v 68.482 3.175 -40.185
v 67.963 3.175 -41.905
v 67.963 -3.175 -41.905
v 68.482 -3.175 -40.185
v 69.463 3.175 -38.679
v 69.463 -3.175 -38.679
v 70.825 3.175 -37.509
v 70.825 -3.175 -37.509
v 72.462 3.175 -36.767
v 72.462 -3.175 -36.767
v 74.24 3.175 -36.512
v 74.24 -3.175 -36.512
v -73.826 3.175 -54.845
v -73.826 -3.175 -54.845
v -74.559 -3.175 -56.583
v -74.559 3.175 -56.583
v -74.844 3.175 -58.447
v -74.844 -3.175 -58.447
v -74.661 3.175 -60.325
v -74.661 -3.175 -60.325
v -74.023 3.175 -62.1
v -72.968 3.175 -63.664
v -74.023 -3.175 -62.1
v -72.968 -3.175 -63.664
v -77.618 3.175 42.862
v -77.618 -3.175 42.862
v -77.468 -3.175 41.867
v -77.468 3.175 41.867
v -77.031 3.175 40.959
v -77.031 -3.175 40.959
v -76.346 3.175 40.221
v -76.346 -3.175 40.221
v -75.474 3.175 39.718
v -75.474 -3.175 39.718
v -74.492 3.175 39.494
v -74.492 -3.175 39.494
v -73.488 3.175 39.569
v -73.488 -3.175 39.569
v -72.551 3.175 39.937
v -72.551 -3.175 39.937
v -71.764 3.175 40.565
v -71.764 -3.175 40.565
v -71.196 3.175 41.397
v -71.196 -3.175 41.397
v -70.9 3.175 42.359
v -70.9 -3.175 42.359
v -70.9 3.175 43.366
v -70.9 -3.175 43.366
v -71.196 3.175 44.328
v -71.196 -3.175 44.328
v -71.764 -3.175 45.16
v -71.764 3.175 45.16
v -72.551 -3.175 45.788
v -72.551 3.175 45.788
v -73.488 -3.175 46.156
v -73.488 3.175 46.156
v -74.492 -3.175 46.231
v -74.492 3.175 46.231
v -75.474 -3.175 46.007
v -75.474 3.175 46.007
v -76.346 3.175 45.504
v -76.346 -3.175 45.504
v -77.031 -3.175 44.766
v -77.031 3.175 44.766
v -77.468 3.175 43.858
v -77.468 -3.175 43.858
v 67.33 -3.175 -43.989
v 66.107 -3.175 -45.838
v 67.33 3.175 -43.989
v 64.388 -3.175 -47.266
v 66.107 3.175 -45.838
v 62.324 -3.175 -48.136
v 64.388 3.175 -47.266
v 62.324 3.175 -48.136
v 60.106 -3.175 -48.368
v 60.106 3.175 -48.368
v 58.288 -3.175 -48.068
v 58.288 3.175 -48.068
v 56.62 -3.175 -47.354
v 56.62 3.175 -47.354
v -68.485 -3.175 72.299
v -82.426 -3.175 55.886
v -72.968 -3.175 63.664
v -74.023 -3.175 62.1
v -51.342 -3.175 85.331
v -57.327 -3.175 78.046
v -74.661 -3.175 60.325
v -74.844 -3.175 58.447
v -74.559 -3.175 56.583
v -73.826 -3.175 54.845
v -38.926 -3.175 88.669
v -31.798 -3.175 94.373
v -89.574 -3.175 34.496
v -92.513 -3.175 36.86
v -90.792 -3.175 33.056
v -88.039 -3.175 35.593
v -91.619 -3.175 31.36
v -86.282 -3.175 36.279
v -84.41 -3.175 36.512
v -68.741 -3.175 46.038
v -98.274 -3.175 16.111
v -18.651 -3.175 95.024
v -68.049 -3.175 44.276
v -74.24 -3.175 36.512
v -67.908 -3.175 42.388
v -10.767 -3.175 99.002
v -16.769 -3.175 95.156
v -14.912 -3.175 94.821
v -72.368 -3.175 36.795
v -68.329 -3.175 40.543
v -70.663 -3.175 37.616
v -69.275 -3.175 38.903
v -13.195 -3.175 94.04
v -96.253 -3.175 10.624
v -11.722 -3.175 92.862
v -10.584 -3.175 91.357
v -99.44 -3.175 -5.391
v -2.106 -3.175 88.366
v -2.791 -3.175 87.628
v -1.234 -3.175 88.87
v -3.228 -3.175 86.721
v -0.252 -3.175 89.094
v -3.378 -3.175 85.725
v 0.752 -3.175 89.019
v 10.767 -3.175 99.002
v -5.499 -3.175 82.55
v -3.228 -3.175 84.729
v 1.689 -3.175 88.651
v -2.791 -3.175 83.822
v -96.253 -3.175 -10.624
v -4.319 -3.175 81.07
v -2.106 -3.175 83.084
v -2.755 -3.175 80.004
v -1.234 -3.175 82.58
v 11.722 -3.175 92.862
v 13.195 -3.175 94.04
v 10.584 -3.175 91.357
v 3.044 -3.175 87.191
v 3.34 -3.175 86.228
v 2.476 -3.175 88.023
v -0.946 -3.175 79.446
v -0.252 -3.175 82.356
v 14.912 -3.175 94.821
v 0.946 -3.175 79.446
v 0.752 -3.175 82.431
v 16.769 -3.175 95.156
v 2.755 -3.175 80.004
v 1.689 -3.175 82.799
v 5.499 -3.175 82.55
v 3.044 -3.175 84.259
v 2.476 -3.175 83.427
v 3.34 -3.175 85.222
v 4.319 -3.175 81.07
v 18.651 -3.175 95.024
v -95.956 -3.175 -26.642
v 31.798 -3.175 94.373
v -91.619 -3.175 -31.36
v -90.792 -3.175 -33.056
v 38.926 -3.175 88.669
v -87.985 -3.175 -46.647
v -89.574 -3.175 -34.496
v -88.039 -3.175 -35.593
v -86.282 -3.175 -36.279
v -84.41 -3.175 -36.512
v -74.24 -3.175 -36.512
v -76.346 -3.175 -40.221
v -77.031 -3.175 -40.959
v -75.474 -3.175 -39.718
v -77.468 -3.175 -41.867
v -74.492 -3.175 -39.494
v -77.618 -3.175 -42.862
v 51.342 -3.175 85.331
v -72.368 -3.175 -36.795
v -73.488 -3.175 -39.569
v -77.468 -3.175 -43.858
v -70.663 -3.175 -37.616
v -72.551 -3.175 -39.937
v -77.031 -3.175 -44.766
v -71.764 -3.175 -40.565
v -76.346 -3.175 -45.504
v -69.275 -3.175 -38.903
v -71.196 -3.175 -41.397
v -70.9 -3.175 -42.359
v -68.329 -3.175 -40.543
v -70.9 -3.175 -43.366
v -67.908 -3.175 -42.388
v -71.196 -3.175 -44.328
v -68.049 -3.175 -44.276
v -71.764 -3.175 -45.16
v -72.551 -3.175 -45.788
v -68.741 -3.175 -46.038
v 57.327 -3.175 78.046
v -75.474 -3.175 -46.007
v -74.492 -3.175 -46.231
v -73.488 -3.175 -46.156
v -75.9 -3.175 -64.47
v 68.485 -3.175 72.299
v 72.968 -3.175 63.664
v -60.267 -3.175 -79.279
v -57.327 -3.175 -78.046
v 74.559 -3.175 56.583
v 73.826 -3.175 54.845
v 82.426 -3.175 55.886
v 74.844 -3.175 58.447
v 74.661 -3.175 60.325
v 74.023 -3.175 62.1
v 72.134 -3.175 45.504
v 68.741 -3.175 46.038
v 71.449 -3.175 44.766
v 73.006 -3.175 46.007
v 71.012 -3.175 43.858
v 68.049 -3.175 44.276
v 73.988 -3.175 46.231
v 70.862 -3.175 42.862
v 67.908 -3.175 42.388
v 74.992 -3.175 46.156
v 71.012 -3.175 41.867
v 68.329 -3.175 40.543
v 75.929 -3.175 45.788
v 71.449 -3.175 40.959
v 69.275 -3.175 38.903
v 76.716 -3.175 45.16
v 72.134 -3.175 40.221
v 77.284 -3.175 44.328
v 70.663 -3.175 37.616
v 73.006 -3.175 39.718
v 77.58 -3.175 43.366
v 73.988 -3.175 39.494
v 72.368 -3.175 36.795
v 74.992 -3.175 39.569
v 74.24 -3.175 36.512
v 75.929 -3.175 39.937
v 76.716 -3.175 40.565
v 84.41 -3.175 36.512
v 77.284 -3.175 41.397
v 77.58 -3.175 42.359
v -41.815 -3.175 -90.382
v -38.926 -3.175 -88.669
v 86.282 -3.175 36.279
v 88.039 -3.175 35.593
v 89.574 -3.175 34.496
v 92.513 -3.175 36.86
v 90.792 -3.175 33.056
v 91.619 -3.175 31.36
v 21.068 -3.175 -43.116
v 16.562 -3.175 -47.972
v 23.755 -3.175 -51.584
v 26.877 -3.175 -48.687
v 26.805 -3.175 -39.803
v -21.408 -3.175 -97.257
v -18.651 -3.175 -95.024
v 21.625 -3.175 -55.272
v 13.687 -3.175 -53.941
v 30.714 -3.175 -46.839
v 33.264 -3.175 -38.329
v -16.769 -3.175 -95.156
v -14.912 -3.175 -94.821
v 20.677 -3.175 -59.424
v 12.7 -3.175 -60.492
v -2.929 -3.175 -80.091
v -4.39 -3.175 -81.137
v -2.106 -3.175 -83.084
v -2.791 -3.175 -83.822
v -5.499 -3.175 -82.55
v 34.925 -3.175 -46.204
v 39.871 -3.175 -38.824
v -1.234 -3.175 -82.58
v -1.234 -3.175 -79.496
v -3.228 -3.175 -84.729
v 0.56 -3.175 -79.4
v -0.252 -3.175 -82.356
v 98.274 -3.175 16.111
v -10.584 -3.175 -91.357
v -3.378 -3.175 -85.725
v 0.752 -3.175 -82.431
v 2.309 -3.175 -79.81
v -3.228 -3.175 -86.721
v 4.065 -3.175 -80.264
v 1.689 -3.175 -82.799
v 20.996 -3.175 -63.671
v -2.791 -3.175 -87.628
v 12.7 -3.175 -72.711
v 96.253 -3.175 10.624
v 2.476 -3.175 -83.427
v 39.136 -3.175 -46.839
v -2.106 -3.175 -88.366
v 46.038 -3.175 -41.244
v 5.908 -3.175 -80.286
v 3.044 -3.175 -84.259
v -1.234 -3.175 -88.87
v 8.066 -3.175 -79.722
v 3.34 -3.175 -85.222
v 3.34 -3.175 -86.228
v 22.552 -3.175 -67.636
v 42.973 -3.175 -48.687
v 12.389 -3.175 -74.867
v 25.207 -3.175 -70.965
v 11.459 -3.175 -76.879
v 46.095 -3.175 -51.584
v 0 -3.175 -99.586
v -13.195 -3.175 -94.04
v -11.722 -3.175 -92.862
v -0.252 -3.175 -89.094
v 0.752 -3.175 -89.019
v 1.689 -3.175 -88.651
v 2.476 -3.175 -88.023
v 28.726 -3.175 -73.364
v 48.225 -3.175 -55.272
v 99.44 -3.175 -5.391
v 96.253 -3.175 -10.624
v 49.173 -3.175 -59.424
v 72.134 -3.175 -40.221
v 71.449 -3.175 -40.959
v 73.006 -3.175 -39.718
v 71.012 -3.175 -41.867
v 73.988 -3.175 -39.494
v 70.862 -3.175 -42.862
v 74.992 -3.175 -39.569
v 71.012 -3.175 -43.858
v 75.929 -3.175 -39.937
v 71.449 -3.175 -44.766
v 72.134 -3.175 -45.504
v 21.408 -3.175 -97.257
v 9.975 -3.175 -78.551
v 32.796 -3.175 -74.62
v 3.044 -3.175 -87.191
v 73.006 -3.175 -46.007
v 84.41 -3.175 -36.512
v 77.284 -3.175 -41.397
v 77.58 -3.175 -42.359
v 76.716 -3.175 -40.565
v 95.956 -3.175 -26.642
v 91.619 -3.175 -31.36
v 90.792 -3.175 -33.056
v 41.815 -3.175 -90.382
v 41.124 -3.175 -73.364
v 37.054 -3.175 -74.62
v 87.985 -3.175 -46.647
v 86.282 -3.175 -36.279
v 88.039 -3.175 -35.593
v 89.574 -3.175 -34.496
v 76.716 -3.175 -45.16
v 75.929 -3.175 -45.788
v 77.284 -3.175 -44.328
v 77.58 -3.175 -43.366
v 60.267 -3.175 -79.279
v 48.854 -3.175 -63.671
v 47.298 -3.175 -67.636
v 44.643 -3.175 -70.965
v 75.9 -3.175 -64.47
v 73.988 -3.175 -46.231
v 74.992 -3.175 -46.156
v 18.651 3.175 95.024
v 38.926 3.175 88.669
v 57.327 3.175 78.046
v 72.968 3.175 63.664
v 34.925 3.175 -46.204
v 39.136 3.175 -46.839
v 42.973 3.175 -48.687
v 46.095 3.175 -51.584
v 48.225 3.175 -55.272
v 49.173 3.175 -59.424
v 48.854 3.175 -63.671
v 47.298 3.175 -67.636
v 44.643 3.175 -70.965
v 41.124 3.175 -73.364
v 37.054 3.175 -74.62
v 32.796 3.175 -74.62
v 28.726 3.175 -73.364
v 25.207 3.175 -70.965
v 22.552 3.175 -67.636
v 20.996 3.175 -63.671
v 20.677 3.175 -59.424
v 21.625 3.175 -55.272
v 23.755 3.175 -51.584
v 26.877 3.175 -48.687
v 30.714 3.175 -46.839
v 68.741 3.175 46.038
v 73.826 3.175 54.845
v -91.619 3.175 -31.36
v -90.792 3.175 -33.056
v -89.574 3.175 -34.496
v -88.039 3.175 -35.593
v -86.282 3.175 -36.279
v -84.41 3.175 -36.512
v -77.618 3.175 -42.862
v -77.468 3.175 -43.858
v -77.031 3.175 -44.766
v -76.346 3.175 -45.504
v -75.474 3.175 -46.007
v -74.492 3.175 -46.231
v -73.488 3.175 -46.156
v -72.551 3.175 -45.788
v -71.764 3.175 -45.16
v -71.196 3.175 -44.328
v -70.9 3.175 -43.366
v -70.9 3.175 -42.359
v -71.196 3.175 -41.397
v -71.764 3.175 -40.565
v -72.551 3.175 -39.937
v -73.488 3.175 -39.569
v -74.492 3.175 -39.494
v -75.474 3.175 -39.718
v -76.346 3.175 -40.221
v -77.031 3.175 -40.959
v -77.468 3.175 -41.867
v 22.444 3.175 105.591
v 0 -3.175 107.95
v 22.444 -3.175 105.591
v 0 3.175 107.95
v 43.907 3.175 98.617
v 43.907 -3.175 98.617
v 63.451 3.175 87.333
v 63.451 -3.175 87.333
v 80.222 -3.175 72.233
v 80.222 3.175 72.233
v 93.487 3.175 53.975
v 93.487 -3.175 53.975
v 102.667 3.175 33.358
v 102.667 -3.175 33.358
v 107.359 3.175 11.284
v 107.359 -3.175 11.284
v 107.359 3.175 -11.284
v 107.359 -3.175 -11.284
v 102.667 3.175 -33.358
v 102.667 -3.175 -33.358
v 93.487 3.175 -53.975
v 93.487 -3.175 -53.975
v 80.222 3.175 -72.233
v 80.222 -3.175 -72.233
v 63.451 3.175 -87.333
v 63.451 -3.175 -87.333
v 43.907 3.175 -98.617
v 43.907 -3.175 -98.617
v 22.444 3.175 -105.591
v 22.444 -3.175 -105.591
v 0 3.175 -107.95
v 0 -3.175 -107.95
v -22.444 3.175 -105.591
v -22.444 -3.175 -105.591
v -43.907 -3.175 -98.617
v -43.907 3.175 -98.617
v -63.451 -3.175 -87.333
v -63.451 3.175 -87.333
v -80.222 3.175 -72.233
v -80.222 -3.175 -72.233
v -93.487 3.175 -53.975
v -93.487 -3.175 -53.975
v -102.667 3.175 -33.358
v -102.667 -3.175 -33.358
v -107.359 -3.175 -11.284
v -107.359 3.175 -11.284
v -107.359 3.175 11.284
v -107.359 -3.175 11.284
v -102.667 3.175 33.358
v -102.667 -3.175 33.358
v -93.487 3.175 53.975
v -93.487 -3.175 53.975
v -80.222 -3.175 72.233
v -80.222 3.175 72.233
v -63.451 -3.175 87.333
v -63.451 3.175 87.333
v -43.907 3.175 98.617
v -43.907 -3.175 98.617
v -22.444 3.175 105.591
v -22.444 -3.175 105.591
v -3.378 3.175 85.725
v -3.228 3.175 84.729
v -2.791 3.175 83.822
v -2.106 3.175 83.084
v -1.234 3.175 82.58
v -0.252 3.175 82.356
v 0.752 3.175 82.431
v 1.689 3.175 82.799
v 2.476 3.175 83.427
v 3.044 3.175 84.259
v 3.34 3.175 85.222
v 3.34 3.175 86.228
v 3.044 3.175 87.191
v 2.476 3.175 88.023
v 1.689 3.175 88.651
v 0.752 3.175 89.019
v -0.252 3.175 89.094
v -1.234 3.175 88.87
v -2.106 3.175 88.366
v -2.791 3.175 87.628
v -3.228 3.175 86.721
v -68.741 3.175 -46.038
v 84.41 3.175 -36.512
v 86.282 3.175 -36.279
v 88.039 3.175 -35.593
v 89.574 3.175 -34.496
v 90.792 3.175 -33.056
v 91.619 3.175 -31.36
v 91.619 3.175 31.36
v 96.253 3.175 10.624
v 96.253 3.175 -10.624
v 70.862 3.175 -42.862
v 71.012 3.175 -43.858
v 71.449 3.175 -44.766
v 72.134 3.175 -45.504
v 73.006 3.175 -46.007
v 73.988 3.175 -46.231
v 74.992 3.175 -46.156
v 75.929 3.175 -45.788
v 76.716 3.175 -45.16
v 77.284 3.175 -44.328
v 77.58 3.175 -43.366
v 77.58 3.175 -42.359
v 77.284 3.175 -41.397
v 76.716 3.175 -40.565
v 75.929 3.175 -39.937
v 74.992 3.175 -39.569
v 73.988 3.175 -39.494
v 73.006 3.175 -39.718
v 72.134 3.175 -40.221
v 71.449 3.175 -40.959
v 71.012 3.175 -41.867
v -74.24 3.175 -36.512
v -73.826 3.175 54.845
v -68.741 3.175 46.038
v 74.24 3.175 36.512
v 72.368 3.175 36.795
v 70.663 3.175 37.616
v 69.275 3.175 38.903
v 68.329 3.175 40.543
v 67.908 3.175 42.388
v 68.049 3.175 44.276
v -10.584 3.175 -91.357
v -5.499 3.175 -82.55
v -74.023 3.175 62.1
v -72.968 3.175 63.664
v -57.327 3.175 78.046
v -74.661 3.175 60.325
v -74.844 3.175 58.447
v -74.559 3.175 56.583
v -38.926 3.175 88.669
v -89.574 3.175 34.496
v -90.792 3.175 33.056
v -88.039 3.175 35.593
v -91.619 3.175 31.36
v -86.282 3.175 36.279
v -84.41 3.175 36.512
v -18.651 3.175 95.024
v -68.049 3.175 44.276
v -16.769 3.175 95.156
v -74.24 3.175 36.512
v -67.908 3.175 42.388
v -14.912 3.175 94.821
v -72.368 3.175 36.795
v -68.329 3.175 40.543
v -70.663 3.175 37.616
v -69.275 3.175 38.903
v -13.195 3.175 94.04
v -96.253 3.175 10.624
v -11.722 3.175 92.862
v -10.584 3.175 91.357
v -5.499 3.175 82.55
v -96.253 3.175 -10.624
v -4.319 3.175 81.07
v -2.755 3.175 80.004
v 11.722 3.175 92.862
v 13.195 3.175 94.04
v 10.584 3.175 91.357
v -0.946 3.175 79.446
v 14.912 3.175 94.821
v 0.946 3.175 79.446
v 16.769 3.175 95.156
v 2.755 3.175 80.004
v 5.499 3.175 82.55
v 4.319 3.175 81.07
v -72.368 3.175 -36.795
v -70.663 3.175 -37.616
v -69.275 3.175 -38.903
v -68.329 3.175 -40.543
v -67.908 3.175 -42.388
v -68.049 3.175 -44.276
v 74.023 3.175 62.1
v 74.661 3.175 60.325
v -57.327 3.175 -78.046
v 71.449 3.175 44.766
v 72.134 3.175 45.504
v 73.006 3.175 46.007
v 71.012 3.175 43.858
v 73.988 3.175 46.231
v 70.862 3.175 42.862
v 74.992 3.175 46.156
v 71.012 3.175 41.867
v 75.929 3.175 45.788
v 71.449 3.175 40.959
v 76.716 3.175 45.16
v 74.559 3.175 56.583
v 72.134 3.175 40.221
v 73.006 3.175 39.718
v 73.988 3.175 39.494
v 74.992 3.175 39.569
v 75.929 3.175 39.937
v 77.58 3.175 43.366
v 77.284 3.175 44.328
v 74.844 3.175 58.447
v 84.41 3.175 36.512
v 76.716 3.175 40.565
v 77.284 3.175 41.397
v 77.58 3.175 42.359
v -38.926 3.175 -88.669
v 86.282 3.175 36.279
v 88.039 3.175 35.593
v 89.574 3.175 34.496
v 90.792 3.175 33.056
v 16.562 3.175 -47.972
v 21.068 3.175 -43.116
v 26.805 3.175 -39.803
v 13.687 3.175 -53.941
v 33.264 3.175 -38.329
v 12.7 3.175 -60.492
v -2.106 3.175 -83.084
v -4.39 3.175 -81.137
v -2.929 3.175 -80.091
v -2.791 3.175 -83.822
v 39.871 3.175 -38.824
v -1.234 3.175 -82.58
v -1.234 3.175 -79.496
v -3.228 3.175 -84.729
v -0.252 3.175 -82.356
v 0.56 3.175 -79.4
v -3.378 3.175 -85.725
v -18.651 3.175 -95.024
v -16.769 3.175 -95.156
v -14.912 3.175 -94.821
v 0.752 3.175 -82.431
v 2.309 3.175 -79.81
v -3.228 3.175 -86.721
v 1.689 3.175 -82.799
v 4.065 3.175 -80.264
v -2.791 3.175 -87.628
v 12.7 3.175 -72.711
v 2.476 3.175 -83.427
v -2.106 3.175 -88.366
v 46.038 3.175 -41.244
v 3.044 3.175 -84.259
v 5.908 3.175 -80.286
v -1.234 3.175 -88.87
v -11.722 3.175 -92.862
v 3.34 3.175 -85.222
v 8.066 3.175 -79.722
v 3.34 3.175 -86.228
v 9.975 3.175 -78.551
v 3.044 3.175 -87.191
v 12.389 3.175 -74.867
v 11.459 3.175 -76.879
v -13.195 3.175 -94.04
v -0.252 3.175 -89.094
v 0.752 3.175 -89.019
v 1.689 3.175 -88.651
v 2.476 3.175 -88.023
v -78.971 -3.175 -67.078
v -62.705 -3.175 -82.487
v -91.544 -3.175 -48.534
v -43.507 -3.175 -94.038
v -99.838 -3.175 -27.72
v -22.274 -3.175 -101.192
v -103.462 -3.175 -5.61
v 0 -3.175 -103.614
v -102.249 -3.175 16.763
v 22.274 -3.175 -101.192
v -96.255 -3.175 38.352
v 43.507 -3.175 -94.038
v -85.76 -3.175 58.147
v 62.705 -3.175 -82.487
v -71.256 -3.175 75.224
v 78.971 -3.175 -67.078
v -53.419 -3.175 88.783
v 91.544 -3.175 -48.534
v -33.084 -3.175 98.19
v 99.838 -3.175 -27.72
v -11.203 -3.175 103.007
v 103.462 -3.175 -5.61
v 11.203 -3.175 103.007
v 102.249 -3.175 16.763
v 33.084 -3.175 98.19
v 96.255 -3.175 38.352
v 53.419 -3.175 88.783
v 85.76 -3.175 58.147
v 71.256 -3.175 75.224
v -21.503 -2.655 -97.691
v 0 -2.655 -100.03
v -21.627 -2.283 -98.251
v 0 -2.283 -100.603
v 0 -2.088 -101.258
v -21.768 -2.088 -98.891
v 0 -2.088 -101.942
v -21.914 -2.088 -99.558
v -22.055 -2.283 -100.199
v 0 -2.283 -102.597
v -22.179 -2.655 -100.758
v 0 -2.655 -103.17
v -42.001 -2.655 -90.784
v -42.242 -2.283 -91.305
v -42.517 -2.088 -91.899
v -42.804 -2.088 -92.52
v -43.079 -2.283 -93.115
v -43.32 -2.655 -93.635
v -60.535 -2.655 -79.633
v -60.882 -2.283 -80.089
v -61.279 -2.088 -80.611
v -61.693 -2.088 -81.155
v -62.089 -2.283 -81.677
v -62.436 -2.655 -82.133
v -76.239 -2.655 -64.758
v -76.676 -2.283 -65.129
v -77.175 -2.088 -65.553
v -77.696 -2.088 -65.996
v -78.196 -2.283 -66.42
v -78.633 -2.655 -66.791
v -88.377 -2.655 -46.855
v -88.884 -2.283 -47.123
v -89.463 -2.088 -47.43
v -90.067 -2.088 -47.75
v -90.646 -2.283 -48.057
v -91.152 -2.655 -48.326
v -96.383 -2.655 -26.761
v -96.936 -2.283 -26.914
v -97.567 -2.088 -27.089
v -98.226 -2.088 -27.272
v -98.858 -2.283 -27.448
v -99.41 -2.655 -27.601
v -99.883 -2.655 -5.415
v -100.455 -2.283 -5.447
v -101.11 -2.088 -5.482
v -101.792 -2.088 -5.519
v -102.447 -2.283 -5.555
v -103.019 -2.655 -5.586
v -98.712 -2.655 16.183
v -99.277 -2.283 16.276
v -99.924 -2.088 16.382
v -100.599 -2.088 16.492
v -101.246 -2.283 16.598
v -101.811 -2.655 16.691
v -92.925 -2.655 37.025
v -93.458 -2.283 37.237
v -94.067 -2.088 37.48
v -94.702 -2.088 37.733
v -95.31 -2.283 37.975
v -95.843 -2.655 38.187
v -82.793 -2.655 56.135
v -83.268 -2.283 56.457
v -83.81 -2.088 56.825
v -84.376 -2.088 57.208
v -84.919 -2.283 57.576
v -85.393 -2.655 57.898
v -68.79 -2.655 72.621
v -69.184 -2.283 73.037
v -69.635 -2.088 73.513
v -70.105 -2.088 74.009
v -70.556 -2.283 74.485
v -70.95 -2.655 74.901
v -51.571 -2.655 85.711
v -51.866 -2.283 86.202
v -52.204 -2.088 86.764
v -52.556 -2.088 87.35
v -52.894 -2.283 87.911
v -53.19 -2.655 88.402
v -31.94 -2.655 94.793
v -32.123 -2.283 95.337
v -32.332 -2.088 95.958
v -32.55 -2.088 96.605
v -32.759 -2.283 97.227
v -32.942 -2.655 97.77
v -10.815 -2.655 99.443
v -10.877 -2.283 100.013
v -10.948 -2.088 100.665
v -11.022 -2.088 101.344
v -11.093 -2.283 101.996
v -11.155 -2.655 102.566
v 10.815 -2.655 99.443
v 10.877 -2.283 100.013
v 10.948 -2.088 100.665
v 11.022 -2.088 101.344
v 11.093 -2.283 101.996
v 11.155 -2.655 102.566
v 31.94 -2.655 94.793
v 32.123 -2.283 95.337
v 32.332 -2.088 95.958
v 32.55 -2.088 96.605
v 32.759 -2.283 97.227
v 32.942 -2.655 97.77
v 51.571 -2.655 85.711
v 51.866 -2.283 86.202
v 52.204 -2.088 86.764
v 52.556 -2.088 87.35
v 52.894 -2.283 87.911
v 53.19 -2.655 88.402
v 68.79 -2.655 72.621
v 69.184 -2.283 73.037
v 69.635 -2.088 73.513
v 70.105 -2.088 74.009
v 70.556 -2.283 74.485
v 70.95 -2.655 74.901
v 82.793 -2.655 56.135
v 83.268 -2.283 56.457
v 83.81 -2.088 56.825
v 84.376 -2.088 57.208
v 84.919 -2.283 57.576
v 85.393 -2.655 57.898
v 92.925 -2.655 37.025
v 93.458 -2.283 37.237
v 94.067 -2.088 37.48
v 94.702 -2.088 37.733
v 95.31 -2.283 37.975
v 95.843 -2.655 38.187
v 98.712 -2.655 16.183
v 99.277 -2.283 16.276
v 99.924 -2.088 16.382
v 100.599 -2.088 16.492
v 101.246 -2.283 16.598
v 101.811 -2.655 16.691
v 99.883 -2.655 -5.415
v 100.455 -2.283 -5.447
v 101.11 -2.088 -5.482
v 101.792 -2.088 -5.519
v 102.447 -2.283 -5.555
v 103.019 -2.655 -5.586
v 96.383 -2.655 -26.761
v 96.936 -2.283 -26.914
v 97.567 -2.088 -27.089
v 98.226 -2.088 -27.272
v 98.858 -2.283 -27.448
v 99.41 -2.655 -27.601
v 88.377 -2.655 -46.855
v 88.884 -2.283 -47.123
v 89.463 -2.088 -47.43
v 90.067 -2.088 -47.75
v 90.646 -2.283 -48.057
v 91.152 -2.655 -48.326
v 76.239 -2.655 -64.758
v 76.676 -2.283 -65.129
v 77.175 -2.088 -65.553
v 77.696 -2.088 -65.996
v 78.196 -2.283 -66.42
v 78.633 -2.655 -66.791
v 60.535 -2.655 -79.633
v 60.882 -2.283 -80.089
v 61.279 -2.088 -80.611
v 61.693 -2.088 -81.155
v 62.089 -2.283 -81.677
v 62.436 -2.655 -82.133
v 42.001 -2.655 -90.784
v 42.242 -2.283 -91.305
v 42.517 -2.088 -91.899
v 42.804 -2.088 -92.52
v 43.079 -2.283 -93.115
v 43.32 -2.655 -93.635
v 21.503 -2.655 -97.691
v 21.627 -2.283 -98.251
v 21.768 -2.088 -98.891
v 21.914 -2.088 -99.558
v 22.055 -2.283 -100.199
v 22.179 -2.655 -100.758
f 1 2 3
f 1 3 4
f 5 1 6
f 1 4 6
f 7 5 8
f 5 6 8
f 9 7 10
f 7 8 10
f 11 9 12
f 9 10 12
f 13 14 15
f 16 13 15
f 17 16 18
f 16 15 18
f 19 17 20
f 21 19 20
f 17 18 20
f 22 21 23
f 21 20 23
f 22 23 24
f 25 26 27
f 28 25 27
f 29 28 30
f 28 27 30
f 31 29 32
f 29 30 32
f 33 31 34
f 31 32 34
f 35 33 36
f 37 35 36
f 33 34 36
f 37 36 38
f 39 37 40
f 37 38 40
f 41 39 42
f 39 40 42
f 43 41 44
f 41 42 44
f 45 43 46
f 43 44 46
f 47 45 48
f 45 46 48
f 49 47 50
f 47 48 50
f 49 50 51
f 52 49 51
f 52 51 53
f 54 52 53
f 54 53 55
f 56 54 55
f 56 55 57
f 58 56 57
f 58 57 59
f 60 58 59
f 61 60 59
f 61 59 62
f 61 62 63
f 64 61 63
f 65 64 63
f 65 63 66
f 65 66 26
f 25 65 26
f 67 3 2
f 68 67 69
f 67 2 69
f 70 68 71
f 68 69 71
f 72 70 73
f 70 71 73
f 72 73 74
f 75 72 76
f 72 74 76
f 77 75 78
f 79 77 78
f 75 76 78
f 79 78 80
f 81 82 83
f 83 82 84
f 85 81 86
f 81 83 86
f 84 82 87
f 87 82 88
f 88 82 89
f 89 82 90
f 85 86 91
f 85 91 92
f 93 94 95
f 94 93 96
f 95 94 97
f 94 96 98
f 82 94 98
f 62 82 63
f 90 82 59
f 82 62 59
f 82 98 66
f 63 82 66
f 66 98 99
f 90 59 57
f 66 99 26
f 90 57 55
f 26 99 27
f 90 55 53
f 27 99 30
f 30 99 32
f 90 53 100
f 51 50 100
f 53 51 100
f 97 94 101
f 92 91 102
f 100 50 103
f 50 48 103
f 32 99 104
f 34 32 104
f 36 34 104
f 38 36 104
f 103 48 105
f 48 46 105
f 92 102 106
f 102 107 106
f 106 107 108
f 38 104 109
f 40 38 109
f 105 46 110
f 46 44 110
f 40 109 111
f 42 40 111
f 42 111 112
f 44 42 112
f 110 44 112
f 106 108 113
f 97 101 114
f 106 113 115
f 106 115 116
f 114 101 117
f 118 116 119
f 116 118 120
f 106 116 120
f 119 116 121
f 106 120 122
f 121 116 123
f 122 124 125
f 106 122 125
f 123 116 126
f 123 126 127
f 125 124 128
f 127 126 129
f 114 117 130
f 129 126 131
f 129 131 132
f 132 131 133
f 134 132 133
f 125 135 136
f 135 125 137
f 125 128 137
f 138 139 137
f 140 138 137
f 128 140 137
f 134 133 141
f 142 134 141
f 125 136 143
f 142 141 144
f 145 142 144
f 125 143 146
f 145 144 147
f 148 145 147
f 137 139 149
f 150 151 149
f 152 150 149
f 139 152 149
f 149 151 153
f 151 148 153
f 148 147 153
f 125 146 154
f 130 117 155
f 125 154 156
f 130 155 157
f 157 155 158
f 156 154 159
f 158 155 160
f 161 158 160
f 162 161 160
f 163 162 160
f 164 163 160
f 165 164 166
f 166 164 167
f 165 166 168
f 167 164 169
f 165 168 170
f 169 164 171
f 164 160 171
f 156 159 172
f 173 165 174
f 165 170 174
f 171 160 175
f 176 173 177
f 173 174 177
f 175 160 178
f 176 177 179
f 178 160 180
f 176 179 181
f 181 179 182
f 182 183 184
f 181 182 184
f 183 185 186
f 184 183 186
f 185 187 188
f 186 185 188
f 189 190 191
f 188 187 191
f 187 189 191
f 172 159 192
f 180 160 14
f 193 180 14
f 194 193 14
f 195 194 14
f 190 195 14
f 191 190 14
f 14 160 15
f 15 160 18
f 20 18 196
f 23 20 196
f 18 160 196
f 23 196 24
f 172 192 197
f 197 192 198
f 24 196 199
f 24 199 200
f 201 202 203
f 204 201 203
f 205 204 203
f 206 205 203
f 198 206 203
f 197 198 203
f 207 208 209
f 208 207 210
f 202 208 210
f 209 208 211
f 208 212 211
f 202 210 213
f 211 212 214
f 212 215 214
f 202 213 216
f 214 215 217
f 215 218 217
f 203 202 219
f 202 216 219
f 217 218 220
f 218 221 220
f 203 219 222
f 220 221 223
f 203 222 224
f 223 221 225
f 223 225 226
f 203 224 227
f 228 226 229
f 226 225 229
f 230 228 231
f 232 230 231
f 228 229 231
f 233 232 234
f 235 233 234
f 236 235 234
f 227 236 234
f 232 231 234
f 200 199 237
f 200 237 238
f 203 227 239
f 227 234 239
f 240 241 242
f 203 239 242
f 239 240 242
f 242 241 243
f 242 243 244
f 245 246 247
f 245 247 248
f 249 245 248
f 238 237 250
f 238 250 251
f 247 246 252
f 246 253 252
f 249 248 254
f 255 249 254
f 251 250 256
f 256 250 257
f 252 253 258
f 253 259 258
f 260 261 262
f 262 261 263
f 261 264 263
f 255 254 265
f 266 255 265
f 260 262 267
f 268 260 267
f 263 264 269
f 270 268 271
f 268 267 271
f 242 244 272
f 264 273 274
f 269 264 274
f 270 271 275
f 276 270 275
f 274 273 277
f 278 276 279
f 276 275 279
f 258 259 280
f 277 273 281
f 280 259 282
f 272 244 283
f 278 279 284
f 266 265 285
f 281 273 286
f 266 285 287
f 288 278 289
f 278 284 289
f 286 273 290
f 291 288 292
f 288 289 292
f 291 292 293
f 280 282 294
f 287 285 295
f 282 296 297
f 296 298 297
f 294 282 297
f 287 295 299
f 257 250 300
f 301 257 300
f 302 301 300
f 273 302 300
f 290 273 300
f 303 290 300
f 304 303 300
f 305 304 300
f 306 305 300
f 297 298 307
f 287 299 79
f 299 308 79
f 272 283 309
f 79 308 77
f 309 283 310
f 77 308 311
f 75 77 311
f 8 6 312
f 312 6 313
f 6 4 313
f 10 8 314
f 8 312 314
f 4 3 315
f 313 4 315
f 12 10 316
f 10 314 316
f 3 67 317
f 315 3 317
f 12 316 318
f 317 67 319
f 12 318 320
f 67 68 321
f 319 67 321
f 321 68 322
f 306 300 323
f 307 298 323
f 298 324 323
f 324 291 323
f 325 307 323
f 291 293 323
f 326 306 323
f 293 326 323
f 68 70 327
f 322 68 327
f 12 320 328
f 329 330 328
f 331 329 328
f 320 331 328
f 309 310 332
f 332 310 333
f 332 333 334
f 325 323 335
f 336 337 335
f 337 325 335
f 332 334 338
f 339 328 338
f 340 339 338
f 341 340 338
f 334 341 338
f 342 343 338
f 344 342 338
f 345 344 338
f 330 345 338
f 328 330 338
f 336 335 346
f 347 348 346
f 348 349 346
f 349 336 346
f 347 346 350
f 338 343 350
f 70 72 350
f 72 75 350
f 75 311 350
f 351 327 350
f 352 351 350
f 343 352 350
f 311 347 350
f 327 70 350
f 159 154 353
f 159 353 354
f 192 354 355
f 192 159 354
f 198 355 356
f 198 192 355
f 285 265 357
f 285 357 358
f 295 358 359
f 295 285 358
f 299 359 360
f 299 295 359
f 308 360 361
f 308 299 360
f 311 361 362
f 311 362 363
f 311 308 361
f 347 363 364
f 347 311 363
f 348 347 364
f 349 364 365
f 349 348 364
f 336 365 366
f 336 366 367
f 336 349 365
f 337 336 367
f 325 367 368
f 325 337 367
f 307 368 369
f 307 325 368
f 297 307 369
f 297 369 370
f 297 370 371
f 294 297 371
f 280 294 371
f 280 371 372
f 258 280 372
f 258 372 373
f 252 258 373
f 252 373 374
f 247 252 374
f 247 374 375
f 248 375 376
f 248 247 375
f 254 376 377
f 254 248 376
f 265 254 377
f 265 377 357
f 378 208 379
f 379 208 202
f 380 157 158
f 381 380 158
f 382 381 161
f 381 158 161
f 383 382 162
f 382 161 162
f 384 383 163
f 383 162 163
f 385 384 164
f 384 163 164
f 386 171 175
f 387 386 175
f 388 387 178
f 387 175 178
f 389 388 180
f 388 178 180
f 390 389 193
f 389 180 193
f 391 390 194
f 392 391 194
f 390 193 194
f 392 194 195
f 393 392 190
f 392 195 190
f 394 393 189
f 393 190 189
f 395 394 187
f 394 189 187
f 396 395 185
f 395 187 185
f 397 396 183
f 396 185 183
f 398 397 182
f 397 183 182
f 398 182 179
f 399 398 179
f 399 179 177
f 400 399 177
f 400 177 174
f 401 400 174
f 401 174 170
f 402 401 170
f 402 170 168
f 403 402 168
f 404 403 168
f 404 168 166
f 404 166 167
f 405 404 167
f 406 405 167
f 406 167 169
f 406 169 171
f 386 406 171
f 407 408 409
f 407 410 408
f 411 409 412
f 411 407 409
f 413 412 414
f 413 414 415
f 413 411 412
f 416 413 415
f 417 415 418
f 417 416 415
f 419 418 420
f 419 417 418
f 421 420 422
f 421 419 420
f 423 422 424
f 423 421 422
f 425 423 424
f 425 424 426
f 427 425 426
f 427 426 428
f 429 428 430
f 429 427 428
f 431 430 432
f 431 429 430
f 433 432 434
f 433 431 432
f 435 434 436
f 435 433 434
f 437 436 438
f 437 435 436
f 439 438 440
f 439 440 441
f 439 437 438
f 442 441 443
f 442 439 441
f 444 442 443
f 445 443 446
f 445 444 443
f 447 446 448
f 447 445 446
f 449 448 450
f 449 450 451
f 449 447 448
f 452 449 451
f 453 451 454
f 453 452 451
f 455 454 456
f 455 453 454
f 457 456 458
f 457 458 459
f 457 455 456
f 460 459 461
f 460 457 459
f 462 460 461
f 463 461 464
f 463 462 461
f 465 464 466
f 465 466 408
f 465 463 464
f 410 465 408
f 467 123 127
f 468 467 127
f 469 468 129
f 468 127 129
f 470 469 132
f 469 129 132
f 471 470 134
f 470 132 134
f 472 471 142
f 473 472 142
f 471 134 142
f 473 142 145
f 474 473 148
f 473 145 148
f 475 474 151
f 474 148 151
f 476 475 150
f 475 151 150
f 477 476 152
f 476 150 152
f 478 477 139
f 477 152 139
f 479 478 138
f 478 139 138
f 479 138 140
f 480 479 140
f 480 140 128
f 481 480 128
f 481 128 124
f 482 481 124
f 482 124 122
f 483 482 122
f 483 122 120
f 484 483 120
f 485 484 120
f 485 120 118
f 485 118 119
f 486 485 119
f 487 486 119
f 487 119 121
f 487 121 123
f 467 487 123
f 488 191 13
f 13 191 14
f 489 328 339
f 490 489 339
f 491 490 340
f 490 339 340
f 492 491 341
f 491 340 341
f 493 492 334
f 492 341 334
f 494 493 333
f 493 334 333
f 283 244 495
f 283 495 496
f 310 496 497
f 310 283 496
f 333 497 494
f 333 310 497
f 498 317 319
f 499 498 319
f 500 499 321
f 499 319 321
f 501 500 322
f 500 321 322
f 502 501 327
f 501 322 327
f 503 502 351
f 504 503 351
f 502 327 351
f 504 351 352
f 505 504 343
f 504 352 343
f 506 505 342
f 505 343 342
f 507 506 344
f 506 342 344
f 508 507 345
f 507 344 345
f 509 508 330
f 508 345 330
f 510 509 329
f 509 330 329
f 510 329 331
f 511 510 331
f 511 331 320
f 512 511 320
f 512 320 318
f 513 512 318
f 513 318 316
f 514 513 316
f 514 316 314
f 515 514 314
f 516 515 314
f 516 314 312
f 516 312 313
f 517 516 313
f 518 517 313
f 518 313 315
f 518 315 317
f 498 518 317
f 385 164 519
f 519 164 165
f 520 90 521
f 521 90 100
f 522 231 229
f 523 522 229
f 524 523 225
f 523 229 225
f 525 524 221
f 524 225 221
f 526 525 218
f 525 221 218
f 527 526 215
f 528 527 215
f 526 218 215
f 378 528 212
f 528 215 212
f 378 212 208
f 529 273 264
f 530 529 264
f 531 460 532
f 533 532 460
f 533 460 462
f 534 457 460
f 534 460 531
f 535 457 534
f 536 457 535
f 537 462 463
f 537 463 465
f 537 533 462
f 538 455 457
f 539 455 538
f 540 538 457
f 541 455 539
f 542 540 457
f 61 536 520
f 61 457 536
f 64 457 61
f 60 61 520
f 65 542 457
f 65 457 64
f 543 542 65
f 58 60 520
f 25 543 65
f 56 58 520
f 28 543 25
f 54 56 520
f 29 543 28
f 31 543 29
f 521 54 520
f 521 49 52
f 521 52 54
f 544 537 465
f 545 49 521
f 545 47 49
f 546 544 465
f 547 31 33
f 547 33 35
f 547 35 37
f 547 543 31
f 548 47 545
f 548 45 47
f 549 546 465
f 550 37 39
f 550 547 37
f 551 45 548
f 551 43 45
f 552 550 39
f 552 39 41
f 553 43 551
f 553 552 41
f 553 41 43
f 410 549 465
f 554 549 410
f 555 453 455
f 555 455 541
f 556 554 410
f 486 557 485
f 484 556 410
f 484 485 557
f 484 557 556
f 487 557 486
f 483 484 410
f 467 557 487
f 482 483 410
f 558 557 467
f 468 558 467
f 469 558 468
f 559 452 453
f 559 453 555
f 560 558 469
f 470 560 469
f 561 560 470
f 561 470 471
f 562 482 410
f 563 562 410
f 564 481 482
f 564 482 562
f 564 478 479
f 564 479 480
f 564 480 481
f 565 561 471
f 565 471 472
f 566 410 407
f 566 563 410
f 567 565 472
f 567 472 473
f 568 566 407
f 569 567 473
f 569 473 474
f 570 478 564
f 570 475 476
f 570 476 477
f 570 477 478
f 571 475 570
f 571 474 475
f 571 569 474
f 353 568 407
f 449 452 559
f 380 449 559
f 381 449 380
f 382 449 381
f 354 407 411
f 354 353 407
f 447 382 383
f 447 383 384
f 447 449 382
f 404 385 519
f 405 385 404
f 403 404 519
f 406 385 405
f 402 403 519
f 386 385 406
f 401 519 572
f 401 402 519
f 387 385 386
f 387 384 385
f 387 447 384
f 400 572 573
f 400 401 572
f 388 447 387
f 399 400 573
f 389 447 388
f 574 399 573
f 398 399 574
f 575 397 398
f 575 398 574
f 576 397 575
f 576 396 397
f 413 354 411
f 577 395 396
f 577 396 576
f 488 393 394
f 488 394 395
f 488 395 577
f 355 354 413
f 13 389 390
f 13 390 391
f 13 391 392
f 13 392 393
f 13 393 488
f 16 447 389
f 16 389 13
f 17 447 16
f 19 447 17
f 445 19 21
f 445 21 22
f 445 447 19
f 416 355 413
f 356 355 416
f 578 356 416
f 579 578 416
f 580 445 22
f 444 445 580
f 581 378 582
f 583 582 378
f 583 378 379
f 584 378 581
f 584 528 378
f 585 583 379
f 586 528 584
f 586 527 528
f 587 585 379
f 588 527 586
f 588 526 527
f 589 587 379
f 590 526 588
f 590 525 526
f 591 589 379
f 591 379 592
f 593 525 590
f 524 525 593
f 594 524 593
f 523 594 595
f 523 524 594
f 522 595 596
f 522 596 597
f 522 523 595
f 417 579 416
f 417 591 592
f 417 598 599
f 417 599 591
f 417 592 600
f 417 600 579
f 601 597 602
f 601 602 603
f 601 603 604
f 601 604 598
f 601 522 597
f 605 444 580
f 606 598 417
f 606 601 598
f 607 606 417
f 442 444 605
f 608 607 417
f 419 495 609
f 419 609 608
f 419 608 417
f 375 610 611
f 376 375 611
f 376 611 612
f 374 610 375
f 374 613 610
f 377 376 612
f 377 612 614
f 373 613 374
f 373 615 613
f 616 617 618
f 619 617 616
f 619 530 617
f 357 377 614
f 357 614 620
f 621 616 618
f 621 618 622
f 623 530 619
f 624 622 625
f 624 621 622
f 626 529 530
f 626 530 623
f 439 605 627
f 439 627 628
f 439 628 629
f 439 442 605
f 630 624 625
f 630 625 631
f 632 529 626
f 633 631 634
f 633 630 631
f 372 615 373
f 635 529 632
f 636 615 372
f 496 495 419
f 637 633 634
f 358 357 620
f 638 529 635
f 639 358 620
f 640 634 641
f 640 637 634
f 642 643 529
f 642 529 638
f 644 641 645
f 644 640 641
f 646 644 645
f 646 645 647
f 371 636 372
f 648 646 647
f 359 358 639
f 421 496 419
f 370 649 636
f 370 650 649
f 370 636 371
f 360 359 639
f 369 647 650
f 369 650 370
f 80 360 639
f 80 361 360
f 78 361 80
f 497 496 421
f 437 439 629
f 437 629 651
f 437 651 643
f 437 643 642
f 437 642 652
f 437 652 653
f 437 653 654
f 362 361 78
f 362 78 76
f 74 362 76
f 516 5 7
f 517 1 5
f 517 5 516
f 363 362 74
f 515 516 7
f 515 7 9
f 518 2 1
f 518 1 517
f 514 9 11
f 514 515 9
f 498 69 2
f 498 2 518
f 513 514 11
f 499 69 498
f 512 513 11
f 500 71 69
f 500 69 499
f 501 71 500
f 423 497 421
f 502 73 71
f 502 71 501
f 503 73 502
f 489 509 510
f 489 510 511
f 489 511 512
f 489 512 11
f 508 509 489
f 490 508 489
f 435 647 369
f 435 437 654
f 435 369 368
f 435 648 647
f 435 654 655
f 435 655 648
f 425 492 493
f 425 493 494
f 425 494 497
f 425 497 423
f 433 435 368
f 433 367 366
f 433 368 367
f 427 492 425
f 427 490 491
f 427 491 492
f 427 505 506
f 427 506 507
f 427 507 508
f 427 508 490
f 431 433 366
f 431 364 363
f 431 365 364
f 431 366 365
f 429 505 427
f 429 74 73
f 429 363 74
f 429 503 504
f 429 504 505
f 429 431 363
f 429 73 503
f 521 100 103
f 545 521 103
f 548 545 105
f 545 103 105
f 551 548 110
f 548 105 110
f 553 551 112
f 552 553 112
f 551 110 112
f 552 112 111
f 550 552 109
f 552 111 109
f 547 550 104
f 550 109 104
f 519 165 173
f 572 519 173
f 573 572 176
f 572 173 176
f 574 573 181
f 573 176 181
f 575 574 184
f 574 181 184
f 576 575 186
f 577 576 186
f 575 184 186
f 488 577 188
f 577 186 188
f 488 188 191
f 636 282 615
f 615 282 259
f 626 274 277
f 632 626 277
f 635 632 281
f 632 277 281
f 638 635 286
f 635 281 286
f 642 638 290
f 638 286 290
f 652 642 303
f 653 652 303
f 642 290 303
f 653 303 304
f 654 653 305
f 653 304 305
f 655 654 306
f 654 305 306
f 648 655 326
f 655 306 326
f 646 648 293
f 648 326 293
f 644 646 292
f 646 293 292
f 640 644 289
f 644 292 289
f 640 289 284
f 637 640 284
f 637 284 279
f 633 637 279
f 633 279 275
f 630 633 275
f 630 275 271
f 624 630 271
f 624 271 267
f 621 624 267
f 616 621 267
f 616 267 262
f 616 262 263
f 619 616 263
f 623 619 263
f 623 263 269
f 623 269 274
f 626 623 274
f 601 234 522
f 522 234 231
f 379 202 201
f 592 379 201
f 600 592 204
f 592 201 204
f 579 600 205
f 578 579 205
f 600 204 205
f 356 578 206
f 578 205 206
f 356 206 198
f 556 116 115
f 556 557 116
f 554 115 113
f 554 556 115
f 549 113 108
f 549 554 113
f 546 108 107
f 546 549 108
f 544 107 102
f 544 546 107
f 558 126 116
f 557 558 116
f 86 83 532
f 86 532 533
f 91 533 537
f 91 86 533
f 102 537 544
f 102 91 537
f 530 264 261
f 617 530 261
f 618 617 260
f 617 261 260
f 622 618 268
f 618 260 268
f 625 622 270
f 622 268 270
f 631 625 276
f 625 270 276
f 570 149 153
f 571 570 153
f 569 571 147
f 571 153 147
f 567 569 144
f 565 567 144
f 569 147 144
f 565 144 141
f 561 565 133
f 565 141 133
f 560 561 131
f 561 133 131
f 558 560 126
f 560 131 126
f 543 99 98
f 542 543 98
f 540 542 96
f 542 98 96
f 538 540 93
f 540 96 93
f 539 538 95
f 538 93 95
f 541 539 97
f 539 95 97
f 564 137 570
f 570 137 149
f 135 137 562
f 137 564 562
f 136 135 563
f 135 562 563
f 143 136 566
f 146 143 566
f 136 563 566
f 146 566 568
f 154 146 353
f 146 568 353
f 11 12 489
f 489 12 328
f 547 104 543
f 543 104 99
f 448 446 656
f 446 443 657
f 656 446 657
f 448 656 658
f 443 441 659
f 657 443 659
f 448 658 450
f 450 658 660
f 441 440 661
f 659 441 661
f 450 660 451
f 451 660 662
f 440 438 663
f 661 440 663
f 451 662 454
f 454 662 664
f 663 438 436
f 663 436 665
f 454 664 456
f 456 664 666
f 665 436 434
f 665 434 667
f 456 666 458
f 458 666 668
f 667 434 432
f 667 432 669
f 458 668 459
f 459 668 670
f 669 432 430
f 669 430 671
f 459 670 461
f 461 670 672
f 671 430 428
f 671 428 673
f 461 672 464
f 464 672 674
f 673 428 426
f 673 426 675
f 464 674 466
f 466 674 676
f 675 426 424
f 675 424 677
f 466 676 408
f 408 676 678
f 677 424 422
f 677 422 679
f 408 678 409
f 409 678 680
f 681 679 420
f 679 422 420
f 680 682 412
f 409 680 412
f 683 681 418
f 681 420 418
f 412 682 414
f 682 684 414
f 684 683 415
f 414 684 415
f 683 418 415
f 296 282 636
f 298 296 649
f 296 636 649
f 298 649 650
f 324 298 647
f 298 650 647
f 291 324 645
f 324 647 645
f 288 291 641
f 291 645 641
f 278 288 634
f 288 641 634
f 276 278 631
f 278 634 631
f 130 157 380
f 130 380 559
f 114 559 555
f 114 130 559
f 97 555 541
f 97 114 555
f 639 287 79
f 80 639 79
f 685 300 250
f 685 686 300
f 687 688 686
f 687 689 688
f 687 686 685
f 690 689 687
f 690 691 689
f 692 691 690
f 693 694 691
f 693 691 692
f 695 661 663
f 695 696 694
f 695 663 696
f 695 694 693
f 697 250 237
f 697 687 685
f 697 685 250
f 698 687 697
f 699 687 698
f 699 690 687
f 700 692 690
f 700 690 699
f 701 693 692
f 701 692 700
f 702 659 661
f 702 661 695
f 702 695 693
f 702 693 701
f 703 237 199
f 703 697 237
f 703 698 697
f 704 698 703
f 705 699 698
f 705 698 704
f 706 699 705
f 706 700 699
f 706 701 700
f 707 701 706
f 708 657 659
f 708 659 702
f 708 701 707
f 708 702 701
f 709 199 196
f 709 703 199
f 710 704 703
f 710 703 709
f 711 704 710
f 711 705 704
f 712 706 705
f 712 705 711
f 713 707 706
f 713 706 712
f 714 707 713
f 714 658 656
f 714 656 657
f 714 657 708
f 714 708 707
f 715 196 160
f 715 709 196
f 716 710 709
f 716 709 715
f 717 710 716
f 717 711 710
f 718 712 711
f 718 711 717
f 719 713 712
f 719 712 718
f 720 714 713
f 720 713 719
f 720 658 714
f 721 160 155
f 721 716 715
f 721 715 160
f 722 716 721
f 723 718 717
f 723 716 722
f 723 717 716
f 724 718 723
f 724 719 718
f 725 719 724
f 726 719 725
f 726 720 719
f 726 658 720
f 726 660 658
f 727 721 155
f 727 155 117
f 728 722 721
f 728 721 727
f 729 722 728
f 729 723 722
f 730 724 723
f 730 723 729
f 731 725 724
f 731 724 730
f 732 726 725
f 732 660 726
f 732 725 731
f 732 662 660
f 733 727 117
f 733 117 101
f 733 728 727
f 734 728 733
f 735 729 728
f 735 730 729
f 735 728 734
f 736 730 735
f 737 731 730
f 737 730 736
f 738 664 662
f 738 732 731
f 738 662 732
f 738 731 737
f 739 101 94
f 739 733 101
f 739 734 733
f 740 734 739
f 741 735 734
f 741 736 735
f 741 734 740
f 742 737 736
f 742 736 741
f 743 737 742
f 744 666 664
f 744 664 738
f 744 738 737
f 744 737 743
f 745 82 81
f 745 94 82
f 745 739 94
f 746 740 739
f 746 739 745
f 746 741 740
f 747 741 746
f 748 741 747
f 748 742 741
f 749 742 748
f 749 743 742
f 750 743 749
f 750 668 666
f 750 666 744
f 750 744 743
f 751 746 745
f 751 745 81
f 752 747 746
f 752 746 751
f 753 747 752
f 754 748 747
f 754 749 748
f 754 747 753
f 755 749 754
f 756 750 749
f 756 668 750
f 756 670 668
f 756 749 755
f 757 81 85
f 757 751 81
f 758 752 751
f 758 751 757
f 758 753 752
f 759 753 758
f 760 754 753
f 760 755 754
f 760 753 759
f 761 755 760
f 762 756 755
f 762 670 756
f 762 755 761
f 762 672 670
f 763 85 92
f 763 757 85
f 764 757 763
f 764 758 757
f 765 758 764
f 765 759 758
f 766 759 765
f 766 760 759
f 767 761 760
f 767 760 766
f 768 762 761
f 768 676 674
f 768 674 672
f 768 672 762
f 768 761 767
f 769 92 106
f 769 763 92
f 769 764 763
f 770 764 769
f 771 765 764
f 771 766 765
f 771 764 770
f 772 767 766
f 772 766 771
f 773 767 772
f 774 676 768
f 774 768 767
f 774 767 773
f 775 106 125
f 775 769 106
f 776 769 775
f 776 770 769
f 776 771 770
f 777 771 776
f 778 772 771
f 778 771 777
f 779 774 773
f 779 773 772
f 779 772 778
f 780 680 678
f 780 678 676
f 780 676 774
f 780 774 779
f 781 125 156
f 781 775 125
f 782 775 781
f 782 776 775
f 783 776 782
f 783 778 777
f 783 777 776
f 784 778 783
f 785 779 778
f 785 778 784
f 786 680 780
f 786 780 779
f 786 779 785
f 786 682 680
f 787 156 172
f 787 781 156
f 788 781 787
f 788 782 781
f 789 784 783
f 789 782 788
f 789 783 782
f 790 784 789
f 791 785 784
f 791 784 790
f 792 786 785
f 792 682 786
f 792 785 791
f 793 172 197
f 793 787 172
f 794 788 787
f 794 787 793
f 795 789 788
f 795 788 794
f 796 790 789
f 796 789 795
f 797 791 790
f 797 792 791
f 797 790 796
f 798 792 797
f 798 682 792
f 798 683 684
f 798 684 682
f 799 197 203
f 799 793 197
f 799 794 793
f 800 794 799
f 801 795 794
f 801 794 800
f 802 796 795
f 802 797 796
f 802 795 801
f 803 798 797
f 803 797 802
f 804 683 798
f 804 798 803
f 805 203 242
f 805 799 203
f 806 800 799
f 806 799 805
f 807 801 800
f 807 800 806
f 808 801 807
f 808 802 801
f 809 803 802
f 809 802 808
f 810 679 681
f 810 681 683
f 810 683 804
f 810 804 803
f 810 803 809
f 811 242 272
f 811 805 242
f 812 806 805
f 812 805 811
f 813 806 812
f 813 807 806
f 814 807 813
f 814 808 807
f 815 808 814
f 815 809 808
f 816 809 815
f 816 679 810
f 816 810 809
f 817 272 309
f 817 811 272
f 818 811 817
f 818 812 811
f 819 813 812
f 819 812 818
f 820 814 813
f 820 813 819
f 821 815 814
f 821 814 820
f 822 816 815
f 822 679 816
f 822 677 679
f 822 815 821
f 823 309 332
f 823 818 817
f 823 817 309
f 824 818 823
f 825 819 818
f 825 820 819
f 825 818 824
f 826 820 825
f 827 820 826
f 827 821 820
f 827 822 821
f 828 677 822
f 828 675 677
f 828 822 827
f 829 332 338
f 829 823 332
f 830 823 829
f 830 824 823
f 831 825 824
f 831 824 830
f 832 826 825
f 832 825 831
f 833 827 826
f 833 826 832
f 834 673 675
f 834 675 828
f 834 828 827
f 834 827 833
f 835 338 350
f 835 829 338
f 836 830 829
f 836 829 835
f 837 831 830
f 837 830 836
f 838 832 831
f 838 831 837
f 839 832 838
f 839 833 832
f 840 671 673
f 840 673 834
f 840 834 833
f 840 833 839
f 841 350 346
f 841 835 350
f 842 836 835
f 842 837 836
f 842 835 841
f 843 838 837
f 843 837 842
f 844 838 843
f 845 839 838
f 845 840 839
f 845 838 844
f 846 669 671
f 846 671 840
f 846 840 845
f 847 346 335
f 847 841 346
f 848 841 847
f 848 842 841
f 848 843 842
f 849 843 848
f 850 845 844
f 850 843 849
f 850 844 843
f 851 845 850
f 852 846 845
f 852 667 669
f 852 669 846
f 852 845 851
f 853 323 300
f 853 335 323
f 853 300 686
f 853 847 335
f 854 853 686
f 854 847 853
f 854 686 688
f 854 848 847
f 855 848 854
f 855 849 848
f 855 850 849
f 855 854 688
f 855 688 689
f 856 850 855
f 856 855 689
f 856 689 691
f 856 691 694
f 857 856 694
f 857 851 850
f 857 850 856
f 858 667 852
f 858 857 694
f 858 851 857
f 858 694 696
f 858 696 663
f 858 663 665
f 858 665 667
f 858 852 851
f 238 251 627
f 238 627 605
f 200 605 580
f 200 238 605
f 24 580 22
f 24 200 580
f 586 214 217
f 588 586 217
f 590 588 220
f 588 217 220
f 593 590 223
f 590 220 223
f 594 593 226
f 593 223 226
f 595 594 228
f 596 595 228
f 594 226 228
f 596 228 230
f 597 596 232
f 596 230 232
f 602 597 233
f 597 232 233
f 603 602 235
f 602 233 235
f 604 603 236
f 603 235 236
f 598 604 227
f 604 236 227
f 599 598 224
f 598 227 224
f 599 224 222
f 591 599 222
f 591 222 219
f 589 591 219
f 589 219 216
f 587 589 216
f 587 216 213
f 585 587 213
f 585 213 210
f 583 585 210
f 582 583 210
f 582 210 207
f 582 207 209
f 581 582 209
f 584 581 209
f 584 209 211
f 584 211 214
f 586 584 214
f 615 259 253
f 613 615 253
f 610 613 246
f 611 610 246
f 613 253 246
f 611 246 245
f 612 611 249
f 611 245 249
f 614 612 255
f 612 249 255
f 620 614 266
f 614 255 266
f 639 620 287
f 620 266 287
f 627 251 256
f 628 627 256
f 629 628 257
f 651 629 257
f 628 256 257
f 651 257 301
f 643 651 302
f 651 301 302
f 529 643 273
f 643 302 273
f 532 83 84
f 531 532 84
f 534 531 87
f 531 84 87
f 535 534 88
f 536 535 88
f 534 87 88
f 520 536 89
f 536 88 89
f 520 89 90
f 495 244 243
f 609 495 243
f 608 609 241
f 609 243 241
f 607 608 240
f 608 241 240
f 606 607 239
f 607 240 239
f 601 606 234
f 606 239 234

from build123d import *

# Parameters (mm, degrees)
SKETCH1_R                   = 107.95
SKETCH1_R_2                 = 96.8375
BOSS_EXTRUDE1_DEPTH         = 3.175
SKETCH2_R                   = 2.38125
BOSS_EXTRUDE2_START         = -6.35
BOSS_EXTRUDE2_DEPTH         = 6.35
BOSS_EXTRUDE3_START         = -6.35
SKETCH7_R                   = 14.2875
BOSS_EXTRUDE3_DEPTH         = 6.35
FILLET1_R                   = 7.62
CIRPATTERN1_START           = -3.175
CIRPATTERN1_DEPTH           = 6.35
F_1_4_CLEARANCE_HOLE1_D     = 6.7564
F_1_4_CLEARANCE_HOLE1_DEPTH = 9.398
F_1_4_CLEARANCE_HOLE1_TIP   = 2.029827343
FILLET2_R                   = 7.62


# Read off the part's stored shape, not the designer's step: CirPattern1
with BuildPart() as part:
    # Sketch1 → Boss-Extrude1 (new, symmetric)
    with BuildSketch(Plane(origin=(0, 0, 0), x_dir=(1, 0, 0), z_dir=(0, 1, 0))):
        with Locations(Location((0, 0, 0), (0, 0, 270))):
            Circle(SKETCH1_R)
        with Locations(Location((0, 0, 0), (0, 0, 270))):
            Circle(SKETCH1_R_2, mode=Mode.SUBTRACT)
    extrude(amount=BOSS_EXTRUDE1_DEPTH, both=True)

    # Sketch2 → Cut-Revolve1 (revolve, cut)
    with BuildSketch(Plane(origin=(0, 0, 0), x_dir=(0, 0, -1), z_dir=(1, 0, 0)), mode=Mode.PRIVATE) as cut_revolve1_sk:
        with Locations((-101.6, -4.445)):
            Circle(SKETCH2_R)
    revolve(cut_revolve1_sk.sketch.rotate(Axis((0, -31.187956177, 0), (0, 1, 0)), 180), axis=Axis((0, -31.187956177, 0), (0, 1, 0)), mode=Mode.SUBTRACT)

    # Sketch3 → Boss-Extrude2 (add)
    with BuildSketch(Plane(origin=(0, 3.175, 0), x_dir=(1, 0, 0), z_dir=(0, 1, 0)).offset(BOSS_EXTRUDE2_START)):
        with BuildLine():
            Line((-5.499261314, -82.55), (-13.224366326, -95.930274374))
            ThreePointArc((-13.224366326, -95.930274374), (0, -96.8375), (13.224366326, -95.930274374))
            Line((13.224366326, -95.930274374), (5.499261314, -82.55))
            ThreePointArc((5.499261314, -82.55), (0, -79.375), (-5.499261314, -82.55))
        make_face()
    extrude(amount=BOSS_EXTRUDE2_DEPTH)

    # Sketch7 → Boss-Extrude3 (add)
    with BuildSketch(Plane(origin=(0, 3.175, 0), x_dir=(1, 0, 0), z_dir=(0, 1, 0)).offset(BOSS_EXTRUDE3_START)):
        with BuildLine():
            ThreePointArc((76.789392316, 58.999073162), (48.41875, 83.863735039), (12.7, 96.001101068))
            Line((12.7, 96.001101068), (12.7, 60.491874454))
            ThreePointArc((12.7, 60.491874454), (23.8125, 41.244459855), (46.0375, 41.244459855))
            Line((46.0375, 41.244459855), (76.789392316, 58.999073162))
        make_face()
        with Locations(Location((34.925, 60.491874454, 0), (0, 0, 270))):
            Circle(SKETCH7_R, mode=Mode.SUBTRACT)
    extrude(amount=BOSS_EXTRUDE3_DEPTH)

    # Fillet1
    fillet1_edges = [part.edges().sort_by_distance(p)[0] for p in [
        (-13.224366326, 0, 95.930274374),
        (13.224366326, 0, 95.930274374),
    ]]
    fillet(fillet1_edges, radius=FILLET1_R)

    # CirPattern1 outline → CirPattern1 (add)
    with BuildSketch(Plane(origin=(0, 0, 0), x_dir=(1, 0, 0), z_dir=(0, 1, 0)).offset(CIRPATTERN1_START)):
        with BuildLine():
            ThreePointArc((72.968215537, -63.664282982), (83.863735039, -48.41875), (91.618994144, -31.360186833))
            ThreePointArc((91.618994144, -31.360186833), (88.840241596, -35.092023113), (84.409630671, -36.5125))
            Line((84.409630671, -36.5125), (74.240027739, -36.5125))
            ThreePointArc((74.240027739, -36.5125), (68.740766425, -39.6875), (68.740766425, -46.0375))
            Line((68.740766425, -46.0375), (73.825567891, -54.844634485))
            ThreePointArc((73.825567891, -54.844634485), (74.810704284, -59.391894543), (72.968215537, -63.664282982))
        make_face()
        with BuildLine():
            Line((75.941505111, 58.509545256), (68.740766425, 46.0375))
            ThreePointArc((68.740766425, 46.0375), (68.740766425, 39.6875), (74.240027739, 36.5125))
            Line((74.240027739, 36.5125), (84.409630671, 36.5125))
            ThreePointArc((84.409630671, 36.5125), (88.840241596, 35.092023113), (91.618994145, 31.360186833))
            ThreePointArc((91.618994145, 31.360186833), (85.330669556, 45.784039133), (76.789392316, 58.999073162))
            Line((76.789392316, 58.999073162), (75.941505111, 58.509545256))
        make_face()
        with BuildLine():
            ThreePointArc((-84.409630671, -36.5125), (-88.840241596, -35.092023113), (-91.618994145, -31.360186833))
            ThreePointArc((-91.618994145, -31.360186833), (-83.863735039, -48.41875), (-72.968215537, -63.664282982))
            ThreePointArc((-72.968215537, -63.664282982), (-74.810704284, -59.391894543), (-73.825567891, -54.844634485))
            Line((-73.825567891, -54.844634485), (-68.740766425, -46.0375))
            ThreePointArc((-68.740766425, -46.0375), (-68.740766425, -39.6875), (-74.240027739, -36.5125))
            Line((-74.240027739, -36.5125), (-84.409630671, -36.5125))
        make_face()
        with BuildLine():
            ThreePointArc((12.7, 96.001101068), (-3.015193802, 96.790547124), (-18.650778608, 95.024469815))
            ThreePointArc((-18.650778608, 95.024469815), (-14.029537312, 94.483917657), (-10.58406278, 91.357134485))
            Line((-10.58406278, 91.357134485), (-5.499261314, 82.55))
            ThreePointArc((-5.499261314, 82.55), (0, 79.375), (5.499261314, 82.55))
            Line((5.499261314, 82.55), (12.7, 95.022045256))
            Line((12.7, 95.022045256), (12.7, 96.001101068))
        make_face()
        with BuildLine():
            Line((-68.740766425, 46.0375), (-73.825567891, 54.844634485))
            ThreePointArc((-73.825567891, 54.844634485), (-74.810704284, 59.391894543), (-72.968215537, 63.664282982))
            ThreePointArc((-72.968215537, 63.664282982), (-83.863735039, 48.41875), (-91.618994145, 31.360186833))
            ThreePointArc((-91.618994145, 31.360186833), (-88.840241596, 35.092023113), (-84.409630671, 36.5125))
            Line((-84.409630671, 36.5125), (-74.240027739, 36.5125))
            ThreePointArc((-74.240027739, 36.5125), (-68.740766425, 39.6875), (-68.740766425, 46.0375))
        make_face()
    extrude(amount=CIRPATTERN1_DEPTH)

    # 1/4 Clearance Hole1
    with Locations(Plane(origin=(0, 3.175, 0), x_dir=(1, 0, 0), z_dir=(0, 1, 0))):
        with Locations((0, -85.725), (74.240027739, -42.8625), (74.240027739, 42.8625), (-74.240027739, 42.8625), (-74.240027739, -42.8625), (0, 85.725)):
            Hole(F_1_4_CLEARANCE_HOLE1_D / 2, depth=F_1_4_CLEARANCE_HOLE1_DEPTH)
            with Locations((0, 0, -(F_1_4_CLEARANCE_HOLE1_DEPTH + F_1_4_CLEARANCE_HOLE1_TIP / 2))):  # 118° drill point
                Cone(0, F_1_4_CLEARANCE_HOLE1_D / 2, F_1_4_CLEARANCE_HOLE1_TIP, mode=Mode.SUBTRACT)

    # Fillet2
    fillet2_edges = [part.edges().sort_by_distance(p)[0] for p in [
        (75.941505111, 0, -58.509545256),
        (12.7, 0, -95.022045256),
    ]]
    fillet(fillet2_edges, radius=FILLET2_R)


solid = part.part
